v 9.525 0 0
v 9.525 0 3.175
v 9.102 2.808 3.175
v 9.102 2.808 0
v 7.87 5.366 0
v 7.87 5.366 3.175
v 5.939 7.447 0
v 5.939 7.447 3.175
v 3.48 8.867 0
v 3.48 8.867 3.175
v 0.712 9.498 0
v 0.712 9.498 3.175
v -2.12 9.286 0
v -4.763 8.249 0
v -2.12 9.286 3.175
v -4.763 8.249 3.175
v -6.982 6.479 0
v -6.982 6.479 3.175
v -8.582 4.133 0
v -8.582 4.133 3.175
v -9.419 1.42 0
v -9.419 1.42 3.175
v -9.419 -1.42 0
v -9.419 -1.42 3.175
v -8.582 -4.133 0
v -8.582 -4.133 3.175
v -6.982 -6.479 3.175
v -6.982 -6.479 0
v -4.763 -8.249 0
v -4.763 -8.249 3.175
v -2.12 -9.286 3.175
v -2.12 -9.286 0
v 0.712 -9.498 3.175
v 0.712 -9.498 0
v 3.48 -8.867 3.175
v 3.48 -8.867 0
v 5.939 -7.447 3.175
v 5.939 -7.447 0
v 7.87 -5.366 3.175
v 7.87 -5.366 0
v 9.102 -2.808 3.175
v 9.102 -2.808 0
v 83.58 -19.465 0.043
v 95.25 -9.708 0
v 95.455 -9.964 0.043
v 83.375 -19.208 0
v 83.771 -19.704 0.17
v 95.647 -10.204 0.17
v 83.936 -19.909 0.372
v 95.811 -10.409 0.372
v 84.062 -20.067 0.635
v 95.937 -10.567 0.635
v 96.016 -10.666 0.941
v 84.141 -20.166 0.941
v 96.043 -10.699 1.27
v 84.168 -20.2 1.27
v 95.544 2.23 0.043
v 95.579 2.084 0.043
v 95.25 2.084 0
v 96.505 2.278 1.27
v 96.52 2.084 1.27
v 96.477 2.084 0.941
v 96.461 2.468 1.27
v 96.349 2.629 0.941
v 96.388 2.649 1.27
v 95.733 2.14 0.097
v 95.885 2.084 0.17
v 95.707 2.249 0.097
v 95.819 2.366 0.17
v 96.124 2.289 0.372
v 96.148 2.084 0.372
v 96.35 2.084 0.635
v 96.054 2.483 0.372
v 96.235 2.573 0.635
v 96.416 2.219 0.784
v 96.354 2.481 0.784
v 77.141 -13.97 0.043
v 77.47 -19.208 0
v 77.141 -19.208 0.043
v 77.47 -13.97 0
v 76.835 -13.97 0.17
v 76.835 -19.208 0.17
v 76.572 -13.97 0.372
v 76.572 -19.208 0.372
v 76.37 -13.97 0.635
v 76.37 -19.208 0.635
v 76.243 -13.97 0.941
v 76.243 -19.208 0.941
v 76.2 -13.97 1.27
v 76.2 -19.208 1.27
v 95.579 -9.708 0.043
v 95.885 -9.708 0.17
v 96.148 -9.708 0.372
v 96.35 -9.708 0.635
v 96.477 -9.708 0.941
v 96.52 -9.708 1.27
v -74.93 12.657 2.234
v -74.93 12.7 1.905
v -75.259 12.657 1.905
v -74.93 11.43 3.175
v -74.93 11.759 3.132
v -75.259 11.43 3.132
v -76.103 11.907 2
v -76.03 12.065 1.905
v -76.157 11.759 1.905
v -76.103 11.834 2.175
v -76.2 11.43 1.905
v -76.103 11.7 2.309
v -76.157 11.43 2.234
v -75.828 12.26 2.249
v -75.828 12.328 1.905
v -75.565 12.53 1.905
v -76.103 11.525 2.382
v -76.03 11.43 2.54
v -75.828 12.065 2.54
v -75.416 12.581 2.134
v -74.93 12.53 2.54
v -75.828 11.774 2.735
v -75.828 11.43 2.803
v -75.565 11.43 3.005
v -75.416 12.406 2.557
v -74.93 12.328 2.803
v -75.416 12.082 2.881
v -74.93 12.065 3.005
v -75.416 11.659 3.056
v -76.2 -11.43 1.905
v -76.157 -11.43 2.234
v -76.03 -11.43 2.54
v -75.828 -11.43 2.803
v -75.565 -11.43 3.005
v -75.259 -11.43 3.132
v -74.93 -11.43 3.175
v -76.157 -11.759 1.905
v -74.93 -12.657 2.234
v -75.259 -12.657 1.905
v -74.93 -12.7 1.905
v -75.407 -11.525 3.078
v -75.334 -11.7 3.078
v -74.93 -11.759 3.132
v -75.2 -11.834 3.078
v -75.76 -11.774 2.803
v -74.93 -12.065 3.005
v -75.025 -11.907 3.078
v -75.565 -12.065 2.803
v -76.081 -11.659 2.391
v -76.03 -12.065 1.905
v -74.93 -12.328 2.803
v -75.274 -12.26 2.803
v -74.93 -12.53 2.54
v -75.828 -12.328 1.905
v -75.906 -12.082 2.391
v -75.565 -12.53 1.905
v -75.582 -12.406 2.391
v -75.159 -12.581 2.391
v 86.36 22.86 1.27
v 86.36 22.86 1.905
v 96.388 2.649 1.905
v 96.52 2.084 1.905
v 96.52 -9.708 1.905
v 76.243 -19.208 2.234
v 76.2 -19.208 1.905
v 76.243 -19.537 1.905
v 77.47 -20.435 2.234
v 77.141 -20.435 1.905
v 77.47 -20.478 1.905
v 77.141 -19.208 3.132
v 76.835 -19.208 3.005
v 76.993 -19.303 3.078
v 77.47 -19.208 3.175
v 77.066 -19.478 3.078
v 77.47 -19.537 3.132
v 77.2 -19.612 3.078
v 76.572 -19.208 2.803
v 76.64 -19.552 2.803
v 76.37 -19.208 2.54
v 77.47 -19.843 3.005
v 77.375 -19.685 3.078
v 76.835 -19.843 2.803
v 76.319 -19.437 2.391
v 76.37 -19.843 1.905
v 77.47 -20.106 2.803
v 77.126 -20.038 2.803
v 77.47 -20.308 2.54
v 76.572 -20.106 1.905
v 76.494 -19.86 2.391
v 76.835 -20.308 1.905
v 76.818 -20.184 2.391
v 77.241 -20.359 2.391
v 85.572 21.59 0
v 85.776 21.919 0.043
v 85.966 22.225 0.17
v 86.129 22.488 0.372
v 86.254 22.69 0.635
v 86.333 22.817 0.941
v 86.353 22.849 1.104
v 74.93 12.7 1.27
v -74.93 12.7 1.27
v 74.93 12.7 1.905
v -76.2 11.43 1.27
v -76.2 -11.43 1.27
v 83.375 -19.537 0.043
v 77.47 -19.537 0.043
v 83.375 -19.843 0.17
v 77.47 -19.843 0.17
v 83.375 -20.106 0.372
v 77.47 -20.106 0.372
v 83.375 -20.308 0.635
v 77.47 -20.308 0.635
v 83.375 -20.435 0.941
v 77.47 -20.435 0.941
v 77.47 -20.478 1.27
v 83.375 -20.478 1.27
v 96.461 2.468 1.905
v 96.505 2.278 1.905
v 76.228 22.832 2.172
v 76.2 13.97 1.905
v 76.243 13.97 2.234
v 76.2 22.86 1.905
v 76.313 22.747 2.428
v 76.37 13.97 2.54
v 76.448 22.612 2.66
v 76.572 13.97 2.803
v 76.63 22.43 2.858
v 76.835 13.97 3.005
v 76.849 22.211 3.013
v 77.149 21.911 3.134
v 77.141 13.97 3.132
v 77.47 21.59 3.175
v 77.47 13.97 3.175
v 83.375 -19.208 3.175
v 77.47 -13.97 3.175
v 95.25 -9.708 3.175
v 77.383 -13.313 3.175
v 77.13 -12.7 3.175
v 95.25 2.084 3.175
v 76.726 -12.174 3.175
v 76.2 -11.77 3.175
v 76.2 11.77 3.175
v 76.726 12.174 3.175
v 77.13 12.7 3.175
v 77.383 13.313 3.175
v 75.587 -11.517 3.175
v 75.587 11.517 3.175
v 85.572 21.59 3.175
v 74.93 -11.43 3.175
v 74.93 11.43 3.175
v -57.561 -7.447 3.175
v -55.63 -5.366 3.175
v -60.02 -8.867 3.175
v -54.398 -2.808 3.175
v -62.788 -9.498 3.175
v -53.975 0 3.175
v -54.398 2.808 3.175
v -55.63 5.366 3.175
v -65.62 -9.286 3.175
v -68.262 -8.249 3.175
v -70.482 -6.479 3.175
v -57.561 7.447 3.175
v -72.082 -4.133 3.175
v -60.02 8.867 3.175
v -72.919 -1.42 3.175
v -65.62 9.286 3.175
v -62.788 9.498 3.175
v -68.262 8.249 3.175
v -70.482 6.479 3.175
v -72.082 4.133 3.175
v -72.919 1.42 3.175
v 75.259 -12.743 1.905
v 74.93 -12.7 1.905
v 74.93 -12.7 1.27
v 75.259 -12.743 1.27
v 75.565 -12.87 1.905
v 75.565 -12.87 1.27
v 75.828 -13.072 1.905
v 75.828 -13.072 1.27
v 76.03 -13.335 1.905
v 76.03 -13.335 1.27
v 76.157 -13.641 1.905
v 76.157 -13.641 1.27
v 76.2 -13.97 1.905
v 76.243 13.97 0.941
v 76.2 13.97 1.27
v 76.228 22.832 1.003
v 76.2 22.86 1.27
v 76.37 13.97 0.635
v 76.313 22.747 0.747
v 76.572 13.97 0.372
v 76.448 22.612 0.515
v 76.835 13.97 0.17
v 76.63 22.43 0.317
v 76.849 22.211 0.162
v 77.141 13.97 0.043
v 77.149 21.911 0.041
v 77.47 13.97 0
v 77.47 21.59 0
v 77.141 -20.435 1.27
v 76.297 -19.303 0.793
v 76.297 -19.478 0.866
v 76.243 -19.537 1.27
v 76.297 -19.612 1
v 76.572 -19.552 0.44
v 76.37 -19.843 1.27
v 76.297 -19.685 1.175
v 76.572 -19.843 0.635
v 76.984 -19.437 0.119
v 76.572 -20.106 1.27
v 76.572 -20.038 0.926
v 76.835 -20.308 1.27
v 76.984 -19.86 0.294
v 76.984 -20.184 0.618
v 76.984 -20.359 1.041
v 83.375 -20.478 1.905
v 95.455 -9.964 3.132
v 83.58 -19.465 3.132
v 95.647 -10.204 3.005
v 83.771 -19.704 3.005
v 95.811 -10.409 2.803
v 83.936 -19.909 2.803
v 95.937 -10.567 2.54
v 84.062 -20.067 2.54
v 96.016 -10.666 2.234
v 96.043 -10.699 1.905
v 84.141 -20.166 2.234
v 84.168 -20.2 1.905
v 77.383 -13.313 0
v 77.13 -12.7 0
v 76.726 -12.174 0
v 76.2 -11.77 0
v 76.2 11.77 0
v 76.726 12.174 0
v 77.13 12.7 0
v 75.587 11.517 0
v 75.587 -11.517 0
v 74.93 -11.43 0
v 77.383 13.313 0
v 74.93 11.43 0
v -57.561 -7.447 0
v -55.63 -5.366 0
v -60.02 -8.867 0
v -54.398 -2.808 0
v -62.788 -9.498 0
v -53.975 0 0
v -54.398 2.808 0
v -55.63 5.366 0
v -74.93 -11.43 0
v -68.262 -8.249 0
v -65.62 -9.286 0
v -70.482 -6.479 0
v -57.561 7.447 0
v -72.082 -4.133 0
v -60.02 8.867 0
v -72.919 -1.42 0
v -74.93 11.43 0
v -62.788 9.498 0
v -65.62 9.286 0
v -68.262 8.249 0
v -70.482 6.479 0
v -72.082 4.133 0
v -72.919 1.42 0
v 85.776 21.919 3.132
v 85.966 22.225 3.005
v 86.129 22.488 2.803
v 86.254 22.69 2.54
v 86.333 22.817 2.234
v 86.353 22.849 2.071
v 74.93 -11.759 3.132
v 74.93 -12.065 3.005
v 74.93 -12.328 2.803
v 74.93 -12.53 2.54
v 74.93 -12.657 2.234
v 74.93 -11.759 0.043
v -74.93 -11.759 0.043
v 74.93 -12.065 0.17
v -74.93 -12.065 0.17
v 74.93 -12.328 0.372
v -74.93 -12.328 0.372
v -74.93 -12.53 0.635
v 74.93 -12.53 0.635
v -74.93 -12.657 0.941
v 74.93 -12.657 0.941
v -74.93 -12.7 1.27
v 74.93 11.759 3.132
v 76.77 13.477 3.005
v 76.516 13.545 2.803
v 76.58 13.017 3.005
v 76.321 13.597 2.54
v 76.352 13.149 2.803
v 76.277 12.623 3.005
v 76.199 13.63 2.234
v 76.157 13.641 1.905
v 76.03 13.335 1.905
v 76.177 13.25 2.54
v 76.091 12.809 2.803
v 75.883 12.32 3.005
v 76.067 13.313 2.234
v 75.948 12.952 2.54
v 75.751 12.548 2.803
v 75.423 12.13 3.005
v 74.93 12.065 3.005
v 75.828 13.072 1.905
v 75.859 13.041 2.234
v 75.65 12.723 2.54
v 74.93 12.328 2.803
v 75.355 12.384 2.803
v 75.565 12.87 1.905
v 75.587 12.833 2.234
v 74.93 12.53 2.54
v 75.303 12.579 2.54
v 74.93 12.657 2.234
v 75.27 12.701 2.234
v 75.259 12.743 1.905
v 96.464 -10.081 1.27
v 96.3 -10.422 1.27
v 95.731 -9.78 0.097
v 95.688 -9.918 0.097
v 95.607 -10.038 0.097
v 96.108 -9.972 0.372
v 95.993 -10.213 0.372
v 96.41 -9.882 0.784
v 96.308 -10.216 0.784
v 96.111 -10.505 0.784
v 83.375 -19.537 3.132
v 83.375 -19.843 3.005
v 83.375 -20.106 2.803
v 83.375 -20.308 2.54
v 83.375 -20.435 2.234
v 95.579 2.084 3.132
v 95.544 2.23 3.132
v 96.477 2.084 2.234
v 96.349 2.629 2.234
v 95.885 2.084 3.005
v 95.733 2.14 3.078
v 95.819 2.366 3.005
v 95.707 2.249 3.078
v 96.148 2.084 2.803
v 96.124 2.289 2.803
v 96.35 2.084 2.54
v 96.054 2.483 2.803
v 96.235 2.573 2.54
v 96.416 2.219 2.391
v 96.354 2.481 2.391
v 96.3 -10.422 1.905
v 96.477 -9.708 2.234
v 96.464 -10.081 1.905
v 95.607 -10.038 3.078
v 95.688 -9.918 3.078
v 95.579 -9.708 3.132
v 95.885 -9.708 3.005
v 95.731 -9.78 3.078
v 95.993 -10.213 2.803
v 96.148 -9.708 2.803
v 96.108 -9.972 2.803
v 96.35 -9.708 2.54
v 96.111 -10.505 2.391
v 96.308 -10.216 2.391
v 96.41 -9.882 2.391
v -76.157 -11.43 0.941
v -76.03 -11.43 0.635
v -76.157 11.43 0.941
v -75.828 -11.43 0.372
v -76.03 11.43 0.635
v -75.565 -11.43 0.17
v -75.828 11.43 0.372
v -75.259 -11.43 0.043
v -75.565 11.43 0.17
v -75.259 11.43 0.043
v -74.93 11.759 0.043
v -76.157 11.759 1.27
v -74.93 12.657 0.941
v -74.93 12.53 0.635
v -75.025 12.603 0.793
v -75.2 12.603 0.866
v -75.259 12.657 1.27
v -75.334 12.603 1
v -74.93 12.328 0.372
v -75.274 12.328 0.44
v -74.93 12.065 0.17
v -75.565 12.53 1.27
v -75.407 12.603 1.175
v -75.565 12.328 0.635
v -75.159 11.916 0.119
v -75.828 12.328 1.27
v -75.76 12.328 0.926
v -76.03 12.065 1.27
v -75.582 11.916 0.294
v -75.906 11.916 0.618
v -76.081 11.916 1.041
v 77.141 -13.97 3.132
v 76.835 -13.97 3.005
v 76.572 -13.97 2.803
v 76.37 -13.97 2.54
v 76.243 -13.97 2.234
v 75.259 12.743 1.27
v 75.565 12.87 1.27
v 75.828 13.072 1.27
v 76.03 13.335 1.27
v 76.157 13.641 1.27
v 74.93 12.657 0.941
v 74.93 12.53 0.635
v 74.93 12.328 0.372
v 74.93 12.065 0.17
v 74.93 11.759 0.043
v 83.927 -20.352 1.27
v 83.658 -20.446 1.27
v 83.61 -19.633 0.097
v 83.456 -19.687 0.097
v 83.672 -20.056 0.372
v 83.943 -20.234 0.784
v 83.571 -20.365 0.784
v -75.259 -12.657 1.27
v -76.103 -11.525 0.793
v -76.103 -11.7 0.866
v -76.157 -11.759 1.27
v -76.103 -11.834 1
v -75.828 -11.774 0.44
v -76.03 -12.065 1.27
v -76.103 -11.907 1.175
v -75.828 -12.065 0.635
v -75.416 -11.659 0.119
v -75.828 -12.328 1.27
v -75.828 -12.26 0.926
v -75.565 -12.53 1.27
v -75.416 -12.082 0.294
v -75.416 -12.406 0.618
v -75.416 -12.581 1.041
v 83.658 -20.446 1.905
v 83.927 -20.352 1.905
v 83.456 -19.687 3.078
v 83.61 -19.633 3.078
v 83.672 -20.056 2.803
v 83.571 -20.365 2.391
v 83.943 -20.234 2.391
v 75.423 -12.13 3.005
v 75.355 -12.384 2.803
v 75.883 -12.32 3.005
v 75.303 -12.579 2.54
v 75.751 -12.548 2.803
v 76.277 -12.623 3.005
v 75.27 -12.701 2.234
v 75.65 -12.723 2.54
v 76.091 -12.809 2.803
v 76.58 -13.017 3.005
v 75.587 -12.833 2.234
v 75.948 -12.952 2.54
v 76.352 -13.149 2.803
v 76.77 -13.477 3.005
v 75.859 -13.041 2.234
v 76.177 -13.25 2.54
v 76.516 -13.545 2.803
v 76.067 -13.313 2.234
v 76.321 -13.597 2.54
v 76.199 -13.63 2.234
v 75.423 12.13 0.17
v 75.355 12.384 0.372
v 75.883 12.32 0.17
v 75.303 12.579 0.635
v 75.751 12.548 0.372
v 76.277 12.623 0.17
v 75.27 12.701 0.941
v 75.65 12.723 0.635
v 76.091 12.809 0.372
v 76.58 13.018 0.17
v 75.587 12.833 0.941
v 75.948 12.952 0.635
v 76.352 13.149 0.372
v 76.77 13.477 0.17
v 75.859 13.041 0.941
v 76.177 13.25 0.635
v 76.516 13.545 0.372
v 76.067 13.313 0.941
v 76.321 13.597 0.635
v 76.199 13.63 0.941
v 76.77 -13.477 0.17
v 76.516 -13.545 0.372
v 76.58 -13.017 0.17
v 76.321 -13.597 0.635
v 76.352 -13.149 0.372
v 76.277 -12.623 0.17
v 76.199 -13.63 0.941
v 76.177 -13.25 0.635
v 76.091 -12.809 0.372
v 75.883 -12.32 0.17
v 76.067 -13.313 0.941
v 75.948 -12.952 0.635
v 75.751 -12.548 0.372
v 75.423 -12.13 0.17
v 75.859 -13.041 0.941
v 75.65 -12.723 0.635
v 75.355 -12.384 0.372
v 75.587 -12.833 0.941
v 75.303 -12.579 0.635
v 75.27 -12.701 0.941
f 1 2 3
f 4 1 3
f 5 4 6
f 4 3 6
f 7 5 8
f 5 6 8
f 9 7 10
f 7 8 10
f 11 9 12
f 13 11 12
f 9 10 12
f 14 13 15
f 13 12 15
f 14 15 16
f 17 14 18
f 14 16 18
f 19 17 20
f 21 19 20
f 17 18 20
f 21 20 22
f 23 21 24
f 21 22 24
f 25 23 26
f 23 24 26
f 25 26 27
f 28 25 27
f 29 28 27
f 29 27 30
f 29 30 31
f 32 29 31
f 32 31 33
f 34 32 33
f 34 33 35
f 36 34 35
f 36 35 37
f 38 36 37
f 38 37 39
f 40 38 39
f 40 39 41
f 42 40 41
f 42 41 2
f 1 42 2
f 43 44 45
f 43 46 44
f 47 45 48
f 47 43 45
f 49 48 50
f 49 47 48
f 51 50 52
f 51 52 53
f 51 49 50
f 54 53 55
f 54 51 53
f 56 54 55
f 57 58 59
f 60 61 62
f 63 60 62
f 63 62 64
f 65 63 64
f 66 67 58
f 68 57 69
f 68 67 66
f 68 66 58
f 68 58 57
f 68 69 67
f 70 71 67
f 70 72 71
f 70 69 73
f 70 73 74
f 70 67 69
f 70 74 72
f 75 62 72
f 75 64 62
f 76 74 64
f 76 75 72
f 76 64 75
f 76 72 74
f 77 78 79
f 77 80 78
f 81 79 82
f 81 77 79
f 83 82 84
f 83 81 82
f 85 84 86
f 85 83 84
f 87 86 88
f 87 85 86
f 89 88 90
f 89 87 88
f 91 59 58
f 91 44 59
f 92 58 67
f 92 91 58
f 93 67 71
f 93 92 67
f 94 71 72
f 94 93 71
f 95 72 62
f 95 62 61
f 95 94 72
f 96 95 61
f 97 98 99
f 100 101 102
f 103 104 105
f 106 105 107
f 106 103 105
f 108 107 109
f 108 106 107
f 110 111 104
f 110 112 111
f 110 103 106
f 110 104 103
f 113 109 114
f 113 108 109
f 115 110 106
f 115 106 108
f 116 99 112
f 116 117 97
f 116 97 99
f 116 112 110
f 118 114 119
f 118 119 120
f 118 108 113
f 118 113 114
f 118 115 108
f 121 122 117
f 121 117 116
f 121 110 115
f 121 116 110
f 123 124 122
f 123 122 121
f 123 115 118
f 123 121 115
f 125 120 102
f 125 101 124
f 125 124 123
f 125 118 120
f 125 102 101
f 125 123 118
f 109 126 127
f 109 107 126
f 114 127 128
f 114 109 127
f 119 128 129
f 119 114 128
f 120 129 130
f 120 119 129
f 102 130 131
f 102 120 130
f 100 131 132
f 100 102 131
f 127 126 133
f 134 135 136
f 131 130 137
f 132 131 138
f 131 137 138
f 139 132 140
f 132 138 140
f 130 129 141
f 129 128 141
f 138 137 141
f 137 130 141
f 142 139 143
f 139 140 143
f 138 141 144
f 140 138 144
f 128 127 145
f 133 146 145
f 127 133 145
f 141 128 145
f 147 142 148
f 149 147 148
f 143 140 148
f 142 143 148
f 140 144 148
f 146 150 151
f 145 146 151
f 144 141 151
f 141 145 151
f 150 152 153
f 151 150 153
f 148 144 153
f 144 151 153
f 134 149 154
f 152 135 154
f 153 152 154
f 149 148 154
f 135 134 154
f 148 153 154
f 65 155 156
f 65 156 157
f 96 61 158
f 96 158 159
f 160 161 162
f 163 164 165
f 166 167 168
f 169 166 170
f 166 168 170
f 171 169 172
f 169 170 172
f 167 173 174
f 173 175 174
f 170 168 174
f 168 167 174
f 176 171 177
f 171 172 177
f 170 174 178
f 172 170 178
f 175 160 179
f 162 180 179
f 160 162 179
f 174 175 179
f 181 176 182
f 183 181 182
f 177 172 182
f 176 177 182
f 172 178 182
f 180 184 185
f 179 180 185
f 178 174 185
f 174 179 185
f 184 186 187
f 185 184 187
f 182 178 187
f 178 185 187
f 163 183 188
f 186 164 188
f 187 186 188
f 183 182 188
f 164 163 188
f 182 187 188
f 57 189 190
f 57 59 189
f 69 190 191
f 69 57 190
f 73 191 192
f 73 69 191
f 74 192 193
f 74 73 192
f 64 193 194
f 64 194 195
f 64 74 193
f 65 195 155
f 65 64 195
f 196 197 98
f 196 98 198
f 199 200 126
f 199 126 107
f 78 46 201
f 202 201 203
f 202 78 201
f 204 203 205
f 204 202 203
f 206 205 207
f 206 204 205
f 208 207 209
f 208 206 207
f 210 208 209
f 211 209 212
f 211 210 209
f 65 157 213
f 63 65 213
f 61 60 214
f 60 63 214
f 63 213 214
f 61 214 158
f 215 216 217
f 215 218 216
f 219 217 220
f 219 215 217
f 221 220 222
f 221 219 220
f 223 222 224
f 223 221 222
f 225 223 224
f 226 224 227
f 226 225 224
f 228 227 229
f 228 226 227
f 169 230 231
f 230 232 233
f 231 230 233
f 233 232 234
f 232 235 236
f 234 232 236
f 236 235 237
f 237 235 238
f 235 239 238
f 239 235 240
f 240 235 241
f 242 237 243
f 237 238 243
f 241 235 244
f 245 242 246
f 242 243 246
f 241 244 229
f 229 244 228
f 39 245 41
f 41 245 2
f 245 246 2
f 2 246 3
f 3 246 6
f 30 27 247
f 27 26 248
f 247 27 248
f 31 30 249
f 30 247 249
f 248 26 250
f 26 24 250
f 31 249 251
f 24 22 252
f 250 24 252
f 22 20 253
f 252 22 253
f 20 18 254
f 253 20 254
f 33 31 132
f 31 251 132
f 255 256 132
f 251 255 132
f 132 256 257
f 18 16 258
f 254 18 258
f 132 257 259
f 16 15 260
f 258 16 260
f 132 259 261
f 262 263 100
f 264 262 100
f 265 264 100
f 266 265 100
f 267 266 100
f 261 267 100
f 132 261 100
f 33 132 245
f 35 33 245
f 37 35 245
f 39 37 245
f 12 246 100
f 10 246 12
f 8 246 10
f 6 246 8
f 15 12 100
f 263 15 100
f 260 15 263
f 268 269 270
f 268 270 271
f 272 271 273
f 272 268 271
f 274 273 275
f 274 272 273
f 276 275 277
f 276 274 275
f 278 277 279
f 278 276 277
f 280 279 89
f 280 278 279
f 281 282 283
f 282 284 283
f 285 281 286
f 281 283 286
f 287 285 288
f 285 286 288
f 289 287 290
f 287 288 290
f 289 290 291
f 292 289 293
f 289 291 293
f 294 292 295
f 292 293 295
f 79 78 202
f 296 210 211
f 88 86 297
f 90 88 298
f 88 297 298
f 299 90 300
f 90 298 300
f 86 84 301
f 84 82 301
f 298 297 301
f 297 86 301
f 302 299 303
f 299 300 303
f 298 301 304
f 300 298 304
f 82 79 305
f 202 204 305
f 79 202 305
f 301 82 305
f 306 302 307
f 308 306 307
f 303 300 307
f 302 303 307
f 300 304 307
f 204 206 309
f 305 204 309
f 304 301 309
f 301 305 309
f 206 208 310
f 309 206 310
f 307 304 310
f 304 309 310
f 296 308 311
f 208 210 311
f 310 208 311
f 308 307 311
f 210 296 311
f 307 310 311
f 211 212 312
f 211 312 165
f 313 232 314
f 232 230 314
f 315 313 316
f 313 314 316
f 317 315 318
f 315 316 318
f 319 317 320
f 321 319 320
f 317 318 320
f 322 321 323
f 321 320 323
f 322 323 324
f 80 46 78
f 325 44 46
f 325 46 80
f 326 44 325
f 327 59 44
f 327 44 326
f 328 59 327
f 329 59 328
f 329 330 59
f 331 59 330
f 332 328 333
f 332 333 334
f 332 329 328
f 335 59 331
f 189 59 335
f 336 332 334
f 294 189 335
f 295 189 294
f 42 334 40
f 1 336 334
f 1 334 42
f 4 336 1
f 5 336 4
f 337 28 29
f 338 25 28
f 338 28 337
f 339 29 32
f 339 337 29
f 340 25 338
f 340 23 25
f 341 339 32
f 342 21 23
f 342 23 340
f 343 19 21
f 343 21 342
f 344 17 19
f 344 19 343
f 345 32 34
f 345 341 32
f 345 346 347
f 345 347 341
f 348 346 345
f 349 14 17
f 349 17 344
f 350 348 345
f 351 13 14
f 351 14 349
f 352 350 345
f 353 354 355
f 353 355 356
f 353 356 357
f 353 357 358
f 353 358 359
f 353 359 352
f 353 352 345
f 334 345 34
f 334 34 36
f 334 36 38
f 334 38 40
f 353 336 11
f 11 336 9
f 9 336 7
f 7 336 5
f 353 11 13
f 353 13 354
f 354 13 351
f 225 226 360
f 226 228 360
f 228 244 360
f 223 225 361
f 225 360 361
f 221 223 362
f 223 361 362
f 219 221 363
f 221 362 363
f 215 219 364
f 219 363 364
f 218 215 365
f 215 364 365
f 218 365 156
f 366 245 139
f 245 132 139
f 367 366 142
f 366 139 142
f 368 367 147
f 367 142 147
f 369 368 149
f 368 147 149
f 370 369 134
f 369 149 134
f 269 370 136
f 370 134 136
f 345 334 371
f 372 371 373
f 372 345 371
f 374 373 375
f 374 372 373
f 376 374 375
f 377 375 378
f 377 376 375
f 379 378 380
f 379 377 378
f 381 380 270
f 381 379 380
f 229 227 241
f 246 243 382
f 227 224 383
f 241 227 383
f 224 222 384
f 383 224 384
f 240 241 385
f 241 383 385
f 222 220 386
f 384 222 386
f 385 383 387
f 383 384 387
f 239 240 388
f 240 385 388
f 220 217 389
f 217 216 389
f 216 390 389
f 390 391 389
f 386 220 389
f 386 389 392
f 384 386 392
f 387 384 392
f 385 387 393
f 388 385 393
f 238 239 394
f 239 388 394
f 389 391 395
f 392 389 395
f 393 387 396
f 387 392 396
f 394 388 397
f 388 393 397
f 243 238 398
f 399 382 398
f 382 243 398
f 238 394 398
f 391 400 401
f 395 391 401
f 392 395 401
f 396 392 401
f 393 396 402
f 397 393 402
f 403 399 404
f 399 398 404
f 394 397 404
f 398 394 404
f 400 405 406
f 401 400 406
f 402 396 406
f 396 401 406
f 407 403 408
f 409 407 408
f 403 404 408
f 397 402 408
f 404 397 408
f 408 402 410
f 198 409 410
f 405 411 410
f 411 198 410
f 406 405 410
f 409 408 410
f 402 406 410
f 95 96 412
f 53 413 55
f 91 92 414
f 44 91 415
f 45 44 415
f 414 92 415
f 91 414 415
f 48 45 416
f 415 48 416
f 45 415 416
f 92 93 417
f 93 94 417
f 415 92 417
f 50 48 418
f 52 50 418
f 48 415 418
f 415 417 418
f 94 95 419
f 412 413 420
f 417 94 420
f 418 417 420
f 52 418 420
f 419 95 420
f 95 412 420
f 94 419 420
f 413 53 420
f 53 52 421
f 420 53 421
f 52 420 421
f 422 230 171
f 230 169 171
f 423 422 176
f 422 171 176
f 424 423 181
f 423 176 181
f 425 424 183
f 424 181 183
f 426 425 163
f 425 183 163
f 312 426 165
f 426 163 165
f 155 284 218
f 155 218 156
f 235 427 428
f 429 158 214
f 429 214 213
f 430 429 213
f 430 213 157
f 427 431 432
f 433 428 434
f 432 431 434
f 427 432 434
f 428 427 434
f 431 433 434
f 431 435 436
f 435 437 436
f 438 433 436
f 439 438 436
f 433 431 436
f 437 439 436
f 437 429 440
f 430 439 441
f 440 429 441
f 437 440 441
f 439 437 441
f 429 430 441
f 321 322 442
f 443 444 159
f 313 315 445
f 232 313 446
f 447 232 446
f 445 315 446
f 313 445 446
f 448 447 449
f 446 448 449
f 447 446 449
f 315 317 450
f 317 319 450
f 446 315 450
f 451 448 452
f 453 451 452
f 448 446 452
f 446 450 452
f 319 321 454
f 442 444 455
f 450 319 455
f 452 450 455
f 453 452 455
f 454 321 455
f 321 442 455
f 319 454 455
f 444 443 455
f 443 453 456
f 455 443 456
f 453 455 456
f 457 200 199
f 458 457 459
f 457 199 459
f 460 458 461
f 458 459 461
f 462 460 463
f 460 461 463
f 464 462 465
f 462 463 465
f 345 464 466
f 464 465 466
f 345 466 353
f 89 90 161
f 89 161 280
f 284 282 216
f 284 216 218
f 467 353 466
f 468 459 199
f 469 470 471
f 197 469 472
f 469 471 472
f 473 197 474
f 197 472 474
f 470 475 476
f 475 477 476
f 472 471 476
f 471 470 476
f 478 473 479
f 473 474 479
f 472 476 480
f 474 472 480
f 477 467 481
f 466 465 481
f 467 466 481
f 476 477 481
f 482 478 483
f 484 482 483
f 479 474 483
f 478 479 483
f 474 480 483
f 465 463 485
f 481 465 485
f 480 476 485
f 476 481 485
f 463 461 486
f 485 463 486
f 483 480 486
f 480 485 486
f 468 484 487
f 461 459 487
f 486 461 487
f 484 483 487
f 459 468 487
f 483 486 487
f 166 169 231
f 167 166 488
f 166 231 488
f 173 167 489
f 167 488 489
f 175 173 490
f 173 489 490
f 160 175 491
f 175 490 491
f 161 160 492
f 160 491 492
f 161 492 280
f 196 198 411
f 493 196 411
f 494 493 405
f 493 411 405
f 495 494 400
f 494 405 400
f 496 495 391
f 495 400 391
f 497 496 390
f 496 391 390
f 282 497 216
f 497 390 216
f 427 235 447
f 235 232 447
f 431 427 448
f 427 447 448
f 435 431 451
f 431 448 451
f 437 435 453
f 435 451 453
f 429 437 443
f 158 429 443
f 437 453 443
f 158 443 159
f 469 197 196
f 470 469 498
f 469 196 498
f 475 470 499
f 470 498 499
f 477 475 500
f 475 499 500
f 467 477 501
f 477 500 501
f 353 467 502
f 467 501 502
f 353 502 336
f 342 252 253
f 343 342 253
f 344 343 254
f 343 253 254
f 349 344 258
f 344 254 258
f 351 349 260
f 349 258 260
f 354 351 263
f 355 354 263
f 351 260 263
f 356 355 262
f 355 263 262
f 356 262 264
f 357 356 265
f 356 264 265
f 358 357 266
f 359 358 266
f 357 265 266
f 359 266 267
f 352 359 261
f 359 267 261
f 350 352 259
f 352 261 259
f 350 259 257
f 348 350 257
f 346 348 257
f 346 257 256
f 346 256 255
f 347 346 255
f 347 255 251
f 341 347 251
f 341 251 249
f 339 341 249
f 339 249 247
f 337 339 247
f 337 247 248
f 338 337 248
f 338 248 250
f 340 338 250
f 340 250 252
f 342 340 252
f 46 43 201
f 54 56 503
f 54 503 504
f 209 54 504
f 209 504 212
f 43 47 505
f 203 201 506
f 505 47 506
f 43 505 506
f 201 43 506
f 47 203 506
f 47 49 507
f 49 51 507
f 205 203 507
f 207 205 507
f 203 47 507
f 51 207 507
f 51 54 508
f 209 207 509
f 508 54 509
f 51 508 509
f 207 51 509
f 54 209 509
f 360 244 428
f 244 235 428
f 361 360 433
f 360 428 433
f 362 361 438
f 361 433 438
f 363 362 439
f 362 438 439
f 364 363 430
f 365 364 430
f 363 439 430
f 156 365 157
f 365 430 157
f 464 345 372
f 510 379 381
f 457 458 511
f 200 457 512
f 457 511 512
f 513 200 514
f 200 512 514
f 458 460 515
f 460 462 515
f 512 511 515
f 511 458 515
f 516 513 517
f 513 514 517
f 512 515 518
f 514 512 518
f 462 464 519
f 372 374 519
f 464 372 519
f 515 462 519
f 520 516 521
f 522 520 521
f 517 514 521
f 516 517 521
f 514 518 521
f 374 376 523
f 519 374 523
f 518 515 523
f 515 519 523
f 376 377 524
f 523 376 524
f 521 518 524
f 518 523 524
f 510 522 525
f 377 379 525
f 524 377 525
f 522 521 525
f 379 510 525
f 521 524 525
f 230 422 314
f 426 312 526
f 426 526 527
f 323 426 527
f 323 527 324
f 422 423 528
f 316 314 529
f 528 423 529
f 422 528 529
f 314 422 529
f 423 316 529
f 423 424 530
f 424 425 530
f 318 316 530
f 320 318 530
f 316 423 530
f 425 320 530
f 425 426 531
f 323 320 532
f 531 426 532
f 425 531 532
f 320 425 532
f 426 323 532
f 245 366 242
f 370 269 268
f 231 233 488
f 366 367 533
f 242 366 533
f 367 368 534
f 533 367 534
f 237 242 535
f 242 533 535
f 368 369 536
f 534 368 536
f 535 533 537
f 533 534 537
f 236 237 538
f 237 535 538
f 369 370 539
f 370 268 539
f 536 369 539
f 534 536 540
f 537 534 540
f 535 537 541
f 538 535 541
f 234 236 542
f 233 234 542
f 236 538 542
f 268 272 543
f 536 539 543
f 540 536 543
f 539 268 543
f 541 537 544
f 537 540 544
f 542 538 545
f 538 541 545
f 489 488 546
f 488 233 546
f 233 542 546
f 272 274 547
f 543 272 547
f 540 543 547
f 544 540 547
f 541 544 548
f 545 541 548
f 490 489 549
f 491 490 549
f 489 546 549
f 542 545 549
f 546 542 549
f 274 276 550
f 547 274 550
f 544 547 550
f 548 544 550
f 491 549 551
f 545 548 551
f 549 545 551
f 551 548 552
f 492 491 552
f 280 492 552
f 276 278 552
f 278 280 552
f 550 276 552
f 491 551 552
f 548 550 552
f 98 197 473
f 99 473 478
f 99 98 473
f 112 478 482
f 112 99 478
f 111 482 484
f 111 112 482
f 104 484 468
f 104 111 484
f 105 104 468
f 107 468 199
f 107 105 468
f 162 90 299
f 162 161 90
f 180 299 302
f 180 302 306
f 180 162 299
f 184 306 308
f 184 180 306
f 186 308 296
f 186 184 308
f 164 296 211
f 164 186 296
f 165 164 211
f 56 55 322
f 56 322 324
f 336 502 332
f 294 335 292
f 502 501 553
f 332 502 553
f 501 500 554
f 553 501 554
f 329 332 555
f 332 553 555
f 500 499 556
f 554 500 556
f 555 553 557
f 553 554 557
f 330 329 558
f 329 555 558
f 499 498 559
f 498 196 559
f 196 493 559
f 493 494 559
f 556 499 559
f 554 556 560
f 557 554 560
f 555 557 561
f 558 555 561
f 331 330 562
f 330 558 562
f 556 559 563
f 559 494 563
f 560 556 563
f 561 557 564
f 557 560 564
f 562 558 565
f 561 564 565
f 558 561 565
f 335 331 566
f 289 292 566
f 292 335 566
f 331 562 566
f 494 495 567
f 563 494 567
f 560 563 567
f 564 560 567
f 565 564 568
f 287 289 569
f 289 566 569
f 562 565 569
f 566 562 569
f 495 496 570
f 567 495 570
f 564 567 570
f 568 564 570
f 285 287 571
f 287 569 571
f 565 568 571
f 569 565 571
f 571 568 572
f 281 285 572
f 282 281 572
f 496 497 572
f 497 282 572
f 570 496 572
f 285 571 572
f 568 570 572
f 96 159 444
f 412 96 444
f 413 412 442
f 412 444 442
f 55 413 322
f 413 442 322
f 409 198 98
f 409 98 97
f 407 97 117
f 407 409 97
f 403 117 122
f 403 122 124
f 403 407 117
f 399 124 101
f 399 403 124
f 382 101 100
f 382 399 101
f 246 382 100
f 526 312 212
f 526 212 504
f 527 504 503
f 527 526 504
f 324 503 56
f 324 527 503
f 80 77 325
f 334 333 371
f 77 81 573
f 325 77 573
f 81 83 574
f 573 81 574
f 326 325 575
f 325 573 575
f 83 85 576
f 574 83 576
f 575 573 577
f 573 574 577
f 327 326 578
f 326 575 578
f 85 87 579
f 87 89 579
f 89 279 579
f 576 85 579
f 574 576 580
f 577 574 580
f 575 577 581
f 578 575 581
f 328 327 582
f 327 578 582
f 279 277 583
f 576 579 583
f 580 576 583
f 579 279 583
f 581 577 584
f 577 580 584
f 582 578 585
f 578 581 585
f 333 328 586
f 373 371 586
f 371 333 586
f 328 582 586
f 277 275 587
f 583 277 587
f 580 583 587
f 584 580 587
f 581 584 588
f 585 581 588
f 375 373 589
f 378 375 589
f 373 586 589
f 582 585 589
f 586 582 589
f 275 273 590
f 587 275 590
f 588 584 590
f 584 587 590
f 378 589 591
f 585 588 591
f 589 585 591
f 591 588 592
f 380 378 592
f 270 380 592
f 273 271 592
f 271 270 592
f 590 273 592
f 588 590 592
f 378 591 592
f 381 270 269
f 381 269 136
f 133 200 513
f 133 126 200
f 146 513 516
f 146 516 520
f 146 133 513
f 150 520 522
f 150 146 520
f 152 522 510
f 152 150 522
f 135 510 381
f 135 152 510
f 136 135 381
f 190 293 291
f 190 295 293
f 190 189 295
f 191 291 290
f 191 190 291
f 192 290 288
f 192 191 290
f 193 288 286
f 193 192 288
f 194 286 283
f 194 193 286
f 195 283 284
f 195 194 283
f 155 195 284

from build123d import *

# Parameters (mm, degrees)
BOSS_EXTRUDE1_DEPTH = 3.175
SKETCH2_R           = 9.525
CUT_EXTRUDE1_DEPTH  = 4.175
FILLET1_R           = 1.27


with BuildPart() as part:
    # Sketch1 → Boss-Extrude1 (new body)
    with BuildSketch(Plane.XY):
        Polygon((-76.2, 12.7), (76.2, 12.7), (76.2, 22.86), (86.36, 22.86), (96.52, 2.381865319), (96.52, -10.318134681), (83.82, -20.478134681), (76.2, -20.478134681), (76.2, -12.7), (-76.2, -12.7), align=None)
    extrude(amount=BOSS_EXTRUDE1_DEPTH)

    # Sketch2 → Cut-Extrude1 (cut, through all)
    with BuildSketch(Plane.XY.offset(3.175)):
        with Locations((-63.5, 0)):
            Circle(SKETCH2_R)
        Circle(SKETCH2_R)
    extrude(amount=-CUT_EXTRUDE1_DEPTH, mode=Mode.SUBTRACT)

    # Fillet1
    fillet1_edges = [part.edges().sort_by_distance(p)[0] for p in [
        (96.52, -3.968134681, 0),
        (90.17, -15.398134681, 0),
        (80.01, -20.478134681, 0),
        (76.2, -16.58906734, 0),
        (0, -12.7, 0),
        (-76.2, 0, 0),
        (0, 12.7, 0),
        (76.2, 17.78, 3.175),
        (76.2, 17.78, 0),
        (81.28, 22.86, 0),
        (91.44, 12.62093266, 0),
        (0, 12.7, 3.175),
        (96.52, 2.381865319, 1.5875),
        (96.52, -10.318134681, 1.5875),
        (83.82, -20.478134681, 1.5875),
        (76.2, -20.478134681, 1.5875),
        (76.2, -12.7, 1.5875),
        (-76.2, -12.7, 1.5875),
        (-76.2, 12.7, 1.5875),
        (76.2, 12.7, 1.5875),
        (-76.2, 0, 3.175),
        (0, -12.7, 3.175),
        (76.2, -16.58906734, 3.175),
        (80.01, -20.478134681, 3.175),
        (90.17, -15.398134681, 3.175),
        (96.52, -3.968134681, 3.175),
        (91.44, 12.62093266, 3.175),
        (81.28, 22.86, 3.175),
    ]]
    fillet(fillet1_edges, radius=FILLET1_R)


solid = part.part
